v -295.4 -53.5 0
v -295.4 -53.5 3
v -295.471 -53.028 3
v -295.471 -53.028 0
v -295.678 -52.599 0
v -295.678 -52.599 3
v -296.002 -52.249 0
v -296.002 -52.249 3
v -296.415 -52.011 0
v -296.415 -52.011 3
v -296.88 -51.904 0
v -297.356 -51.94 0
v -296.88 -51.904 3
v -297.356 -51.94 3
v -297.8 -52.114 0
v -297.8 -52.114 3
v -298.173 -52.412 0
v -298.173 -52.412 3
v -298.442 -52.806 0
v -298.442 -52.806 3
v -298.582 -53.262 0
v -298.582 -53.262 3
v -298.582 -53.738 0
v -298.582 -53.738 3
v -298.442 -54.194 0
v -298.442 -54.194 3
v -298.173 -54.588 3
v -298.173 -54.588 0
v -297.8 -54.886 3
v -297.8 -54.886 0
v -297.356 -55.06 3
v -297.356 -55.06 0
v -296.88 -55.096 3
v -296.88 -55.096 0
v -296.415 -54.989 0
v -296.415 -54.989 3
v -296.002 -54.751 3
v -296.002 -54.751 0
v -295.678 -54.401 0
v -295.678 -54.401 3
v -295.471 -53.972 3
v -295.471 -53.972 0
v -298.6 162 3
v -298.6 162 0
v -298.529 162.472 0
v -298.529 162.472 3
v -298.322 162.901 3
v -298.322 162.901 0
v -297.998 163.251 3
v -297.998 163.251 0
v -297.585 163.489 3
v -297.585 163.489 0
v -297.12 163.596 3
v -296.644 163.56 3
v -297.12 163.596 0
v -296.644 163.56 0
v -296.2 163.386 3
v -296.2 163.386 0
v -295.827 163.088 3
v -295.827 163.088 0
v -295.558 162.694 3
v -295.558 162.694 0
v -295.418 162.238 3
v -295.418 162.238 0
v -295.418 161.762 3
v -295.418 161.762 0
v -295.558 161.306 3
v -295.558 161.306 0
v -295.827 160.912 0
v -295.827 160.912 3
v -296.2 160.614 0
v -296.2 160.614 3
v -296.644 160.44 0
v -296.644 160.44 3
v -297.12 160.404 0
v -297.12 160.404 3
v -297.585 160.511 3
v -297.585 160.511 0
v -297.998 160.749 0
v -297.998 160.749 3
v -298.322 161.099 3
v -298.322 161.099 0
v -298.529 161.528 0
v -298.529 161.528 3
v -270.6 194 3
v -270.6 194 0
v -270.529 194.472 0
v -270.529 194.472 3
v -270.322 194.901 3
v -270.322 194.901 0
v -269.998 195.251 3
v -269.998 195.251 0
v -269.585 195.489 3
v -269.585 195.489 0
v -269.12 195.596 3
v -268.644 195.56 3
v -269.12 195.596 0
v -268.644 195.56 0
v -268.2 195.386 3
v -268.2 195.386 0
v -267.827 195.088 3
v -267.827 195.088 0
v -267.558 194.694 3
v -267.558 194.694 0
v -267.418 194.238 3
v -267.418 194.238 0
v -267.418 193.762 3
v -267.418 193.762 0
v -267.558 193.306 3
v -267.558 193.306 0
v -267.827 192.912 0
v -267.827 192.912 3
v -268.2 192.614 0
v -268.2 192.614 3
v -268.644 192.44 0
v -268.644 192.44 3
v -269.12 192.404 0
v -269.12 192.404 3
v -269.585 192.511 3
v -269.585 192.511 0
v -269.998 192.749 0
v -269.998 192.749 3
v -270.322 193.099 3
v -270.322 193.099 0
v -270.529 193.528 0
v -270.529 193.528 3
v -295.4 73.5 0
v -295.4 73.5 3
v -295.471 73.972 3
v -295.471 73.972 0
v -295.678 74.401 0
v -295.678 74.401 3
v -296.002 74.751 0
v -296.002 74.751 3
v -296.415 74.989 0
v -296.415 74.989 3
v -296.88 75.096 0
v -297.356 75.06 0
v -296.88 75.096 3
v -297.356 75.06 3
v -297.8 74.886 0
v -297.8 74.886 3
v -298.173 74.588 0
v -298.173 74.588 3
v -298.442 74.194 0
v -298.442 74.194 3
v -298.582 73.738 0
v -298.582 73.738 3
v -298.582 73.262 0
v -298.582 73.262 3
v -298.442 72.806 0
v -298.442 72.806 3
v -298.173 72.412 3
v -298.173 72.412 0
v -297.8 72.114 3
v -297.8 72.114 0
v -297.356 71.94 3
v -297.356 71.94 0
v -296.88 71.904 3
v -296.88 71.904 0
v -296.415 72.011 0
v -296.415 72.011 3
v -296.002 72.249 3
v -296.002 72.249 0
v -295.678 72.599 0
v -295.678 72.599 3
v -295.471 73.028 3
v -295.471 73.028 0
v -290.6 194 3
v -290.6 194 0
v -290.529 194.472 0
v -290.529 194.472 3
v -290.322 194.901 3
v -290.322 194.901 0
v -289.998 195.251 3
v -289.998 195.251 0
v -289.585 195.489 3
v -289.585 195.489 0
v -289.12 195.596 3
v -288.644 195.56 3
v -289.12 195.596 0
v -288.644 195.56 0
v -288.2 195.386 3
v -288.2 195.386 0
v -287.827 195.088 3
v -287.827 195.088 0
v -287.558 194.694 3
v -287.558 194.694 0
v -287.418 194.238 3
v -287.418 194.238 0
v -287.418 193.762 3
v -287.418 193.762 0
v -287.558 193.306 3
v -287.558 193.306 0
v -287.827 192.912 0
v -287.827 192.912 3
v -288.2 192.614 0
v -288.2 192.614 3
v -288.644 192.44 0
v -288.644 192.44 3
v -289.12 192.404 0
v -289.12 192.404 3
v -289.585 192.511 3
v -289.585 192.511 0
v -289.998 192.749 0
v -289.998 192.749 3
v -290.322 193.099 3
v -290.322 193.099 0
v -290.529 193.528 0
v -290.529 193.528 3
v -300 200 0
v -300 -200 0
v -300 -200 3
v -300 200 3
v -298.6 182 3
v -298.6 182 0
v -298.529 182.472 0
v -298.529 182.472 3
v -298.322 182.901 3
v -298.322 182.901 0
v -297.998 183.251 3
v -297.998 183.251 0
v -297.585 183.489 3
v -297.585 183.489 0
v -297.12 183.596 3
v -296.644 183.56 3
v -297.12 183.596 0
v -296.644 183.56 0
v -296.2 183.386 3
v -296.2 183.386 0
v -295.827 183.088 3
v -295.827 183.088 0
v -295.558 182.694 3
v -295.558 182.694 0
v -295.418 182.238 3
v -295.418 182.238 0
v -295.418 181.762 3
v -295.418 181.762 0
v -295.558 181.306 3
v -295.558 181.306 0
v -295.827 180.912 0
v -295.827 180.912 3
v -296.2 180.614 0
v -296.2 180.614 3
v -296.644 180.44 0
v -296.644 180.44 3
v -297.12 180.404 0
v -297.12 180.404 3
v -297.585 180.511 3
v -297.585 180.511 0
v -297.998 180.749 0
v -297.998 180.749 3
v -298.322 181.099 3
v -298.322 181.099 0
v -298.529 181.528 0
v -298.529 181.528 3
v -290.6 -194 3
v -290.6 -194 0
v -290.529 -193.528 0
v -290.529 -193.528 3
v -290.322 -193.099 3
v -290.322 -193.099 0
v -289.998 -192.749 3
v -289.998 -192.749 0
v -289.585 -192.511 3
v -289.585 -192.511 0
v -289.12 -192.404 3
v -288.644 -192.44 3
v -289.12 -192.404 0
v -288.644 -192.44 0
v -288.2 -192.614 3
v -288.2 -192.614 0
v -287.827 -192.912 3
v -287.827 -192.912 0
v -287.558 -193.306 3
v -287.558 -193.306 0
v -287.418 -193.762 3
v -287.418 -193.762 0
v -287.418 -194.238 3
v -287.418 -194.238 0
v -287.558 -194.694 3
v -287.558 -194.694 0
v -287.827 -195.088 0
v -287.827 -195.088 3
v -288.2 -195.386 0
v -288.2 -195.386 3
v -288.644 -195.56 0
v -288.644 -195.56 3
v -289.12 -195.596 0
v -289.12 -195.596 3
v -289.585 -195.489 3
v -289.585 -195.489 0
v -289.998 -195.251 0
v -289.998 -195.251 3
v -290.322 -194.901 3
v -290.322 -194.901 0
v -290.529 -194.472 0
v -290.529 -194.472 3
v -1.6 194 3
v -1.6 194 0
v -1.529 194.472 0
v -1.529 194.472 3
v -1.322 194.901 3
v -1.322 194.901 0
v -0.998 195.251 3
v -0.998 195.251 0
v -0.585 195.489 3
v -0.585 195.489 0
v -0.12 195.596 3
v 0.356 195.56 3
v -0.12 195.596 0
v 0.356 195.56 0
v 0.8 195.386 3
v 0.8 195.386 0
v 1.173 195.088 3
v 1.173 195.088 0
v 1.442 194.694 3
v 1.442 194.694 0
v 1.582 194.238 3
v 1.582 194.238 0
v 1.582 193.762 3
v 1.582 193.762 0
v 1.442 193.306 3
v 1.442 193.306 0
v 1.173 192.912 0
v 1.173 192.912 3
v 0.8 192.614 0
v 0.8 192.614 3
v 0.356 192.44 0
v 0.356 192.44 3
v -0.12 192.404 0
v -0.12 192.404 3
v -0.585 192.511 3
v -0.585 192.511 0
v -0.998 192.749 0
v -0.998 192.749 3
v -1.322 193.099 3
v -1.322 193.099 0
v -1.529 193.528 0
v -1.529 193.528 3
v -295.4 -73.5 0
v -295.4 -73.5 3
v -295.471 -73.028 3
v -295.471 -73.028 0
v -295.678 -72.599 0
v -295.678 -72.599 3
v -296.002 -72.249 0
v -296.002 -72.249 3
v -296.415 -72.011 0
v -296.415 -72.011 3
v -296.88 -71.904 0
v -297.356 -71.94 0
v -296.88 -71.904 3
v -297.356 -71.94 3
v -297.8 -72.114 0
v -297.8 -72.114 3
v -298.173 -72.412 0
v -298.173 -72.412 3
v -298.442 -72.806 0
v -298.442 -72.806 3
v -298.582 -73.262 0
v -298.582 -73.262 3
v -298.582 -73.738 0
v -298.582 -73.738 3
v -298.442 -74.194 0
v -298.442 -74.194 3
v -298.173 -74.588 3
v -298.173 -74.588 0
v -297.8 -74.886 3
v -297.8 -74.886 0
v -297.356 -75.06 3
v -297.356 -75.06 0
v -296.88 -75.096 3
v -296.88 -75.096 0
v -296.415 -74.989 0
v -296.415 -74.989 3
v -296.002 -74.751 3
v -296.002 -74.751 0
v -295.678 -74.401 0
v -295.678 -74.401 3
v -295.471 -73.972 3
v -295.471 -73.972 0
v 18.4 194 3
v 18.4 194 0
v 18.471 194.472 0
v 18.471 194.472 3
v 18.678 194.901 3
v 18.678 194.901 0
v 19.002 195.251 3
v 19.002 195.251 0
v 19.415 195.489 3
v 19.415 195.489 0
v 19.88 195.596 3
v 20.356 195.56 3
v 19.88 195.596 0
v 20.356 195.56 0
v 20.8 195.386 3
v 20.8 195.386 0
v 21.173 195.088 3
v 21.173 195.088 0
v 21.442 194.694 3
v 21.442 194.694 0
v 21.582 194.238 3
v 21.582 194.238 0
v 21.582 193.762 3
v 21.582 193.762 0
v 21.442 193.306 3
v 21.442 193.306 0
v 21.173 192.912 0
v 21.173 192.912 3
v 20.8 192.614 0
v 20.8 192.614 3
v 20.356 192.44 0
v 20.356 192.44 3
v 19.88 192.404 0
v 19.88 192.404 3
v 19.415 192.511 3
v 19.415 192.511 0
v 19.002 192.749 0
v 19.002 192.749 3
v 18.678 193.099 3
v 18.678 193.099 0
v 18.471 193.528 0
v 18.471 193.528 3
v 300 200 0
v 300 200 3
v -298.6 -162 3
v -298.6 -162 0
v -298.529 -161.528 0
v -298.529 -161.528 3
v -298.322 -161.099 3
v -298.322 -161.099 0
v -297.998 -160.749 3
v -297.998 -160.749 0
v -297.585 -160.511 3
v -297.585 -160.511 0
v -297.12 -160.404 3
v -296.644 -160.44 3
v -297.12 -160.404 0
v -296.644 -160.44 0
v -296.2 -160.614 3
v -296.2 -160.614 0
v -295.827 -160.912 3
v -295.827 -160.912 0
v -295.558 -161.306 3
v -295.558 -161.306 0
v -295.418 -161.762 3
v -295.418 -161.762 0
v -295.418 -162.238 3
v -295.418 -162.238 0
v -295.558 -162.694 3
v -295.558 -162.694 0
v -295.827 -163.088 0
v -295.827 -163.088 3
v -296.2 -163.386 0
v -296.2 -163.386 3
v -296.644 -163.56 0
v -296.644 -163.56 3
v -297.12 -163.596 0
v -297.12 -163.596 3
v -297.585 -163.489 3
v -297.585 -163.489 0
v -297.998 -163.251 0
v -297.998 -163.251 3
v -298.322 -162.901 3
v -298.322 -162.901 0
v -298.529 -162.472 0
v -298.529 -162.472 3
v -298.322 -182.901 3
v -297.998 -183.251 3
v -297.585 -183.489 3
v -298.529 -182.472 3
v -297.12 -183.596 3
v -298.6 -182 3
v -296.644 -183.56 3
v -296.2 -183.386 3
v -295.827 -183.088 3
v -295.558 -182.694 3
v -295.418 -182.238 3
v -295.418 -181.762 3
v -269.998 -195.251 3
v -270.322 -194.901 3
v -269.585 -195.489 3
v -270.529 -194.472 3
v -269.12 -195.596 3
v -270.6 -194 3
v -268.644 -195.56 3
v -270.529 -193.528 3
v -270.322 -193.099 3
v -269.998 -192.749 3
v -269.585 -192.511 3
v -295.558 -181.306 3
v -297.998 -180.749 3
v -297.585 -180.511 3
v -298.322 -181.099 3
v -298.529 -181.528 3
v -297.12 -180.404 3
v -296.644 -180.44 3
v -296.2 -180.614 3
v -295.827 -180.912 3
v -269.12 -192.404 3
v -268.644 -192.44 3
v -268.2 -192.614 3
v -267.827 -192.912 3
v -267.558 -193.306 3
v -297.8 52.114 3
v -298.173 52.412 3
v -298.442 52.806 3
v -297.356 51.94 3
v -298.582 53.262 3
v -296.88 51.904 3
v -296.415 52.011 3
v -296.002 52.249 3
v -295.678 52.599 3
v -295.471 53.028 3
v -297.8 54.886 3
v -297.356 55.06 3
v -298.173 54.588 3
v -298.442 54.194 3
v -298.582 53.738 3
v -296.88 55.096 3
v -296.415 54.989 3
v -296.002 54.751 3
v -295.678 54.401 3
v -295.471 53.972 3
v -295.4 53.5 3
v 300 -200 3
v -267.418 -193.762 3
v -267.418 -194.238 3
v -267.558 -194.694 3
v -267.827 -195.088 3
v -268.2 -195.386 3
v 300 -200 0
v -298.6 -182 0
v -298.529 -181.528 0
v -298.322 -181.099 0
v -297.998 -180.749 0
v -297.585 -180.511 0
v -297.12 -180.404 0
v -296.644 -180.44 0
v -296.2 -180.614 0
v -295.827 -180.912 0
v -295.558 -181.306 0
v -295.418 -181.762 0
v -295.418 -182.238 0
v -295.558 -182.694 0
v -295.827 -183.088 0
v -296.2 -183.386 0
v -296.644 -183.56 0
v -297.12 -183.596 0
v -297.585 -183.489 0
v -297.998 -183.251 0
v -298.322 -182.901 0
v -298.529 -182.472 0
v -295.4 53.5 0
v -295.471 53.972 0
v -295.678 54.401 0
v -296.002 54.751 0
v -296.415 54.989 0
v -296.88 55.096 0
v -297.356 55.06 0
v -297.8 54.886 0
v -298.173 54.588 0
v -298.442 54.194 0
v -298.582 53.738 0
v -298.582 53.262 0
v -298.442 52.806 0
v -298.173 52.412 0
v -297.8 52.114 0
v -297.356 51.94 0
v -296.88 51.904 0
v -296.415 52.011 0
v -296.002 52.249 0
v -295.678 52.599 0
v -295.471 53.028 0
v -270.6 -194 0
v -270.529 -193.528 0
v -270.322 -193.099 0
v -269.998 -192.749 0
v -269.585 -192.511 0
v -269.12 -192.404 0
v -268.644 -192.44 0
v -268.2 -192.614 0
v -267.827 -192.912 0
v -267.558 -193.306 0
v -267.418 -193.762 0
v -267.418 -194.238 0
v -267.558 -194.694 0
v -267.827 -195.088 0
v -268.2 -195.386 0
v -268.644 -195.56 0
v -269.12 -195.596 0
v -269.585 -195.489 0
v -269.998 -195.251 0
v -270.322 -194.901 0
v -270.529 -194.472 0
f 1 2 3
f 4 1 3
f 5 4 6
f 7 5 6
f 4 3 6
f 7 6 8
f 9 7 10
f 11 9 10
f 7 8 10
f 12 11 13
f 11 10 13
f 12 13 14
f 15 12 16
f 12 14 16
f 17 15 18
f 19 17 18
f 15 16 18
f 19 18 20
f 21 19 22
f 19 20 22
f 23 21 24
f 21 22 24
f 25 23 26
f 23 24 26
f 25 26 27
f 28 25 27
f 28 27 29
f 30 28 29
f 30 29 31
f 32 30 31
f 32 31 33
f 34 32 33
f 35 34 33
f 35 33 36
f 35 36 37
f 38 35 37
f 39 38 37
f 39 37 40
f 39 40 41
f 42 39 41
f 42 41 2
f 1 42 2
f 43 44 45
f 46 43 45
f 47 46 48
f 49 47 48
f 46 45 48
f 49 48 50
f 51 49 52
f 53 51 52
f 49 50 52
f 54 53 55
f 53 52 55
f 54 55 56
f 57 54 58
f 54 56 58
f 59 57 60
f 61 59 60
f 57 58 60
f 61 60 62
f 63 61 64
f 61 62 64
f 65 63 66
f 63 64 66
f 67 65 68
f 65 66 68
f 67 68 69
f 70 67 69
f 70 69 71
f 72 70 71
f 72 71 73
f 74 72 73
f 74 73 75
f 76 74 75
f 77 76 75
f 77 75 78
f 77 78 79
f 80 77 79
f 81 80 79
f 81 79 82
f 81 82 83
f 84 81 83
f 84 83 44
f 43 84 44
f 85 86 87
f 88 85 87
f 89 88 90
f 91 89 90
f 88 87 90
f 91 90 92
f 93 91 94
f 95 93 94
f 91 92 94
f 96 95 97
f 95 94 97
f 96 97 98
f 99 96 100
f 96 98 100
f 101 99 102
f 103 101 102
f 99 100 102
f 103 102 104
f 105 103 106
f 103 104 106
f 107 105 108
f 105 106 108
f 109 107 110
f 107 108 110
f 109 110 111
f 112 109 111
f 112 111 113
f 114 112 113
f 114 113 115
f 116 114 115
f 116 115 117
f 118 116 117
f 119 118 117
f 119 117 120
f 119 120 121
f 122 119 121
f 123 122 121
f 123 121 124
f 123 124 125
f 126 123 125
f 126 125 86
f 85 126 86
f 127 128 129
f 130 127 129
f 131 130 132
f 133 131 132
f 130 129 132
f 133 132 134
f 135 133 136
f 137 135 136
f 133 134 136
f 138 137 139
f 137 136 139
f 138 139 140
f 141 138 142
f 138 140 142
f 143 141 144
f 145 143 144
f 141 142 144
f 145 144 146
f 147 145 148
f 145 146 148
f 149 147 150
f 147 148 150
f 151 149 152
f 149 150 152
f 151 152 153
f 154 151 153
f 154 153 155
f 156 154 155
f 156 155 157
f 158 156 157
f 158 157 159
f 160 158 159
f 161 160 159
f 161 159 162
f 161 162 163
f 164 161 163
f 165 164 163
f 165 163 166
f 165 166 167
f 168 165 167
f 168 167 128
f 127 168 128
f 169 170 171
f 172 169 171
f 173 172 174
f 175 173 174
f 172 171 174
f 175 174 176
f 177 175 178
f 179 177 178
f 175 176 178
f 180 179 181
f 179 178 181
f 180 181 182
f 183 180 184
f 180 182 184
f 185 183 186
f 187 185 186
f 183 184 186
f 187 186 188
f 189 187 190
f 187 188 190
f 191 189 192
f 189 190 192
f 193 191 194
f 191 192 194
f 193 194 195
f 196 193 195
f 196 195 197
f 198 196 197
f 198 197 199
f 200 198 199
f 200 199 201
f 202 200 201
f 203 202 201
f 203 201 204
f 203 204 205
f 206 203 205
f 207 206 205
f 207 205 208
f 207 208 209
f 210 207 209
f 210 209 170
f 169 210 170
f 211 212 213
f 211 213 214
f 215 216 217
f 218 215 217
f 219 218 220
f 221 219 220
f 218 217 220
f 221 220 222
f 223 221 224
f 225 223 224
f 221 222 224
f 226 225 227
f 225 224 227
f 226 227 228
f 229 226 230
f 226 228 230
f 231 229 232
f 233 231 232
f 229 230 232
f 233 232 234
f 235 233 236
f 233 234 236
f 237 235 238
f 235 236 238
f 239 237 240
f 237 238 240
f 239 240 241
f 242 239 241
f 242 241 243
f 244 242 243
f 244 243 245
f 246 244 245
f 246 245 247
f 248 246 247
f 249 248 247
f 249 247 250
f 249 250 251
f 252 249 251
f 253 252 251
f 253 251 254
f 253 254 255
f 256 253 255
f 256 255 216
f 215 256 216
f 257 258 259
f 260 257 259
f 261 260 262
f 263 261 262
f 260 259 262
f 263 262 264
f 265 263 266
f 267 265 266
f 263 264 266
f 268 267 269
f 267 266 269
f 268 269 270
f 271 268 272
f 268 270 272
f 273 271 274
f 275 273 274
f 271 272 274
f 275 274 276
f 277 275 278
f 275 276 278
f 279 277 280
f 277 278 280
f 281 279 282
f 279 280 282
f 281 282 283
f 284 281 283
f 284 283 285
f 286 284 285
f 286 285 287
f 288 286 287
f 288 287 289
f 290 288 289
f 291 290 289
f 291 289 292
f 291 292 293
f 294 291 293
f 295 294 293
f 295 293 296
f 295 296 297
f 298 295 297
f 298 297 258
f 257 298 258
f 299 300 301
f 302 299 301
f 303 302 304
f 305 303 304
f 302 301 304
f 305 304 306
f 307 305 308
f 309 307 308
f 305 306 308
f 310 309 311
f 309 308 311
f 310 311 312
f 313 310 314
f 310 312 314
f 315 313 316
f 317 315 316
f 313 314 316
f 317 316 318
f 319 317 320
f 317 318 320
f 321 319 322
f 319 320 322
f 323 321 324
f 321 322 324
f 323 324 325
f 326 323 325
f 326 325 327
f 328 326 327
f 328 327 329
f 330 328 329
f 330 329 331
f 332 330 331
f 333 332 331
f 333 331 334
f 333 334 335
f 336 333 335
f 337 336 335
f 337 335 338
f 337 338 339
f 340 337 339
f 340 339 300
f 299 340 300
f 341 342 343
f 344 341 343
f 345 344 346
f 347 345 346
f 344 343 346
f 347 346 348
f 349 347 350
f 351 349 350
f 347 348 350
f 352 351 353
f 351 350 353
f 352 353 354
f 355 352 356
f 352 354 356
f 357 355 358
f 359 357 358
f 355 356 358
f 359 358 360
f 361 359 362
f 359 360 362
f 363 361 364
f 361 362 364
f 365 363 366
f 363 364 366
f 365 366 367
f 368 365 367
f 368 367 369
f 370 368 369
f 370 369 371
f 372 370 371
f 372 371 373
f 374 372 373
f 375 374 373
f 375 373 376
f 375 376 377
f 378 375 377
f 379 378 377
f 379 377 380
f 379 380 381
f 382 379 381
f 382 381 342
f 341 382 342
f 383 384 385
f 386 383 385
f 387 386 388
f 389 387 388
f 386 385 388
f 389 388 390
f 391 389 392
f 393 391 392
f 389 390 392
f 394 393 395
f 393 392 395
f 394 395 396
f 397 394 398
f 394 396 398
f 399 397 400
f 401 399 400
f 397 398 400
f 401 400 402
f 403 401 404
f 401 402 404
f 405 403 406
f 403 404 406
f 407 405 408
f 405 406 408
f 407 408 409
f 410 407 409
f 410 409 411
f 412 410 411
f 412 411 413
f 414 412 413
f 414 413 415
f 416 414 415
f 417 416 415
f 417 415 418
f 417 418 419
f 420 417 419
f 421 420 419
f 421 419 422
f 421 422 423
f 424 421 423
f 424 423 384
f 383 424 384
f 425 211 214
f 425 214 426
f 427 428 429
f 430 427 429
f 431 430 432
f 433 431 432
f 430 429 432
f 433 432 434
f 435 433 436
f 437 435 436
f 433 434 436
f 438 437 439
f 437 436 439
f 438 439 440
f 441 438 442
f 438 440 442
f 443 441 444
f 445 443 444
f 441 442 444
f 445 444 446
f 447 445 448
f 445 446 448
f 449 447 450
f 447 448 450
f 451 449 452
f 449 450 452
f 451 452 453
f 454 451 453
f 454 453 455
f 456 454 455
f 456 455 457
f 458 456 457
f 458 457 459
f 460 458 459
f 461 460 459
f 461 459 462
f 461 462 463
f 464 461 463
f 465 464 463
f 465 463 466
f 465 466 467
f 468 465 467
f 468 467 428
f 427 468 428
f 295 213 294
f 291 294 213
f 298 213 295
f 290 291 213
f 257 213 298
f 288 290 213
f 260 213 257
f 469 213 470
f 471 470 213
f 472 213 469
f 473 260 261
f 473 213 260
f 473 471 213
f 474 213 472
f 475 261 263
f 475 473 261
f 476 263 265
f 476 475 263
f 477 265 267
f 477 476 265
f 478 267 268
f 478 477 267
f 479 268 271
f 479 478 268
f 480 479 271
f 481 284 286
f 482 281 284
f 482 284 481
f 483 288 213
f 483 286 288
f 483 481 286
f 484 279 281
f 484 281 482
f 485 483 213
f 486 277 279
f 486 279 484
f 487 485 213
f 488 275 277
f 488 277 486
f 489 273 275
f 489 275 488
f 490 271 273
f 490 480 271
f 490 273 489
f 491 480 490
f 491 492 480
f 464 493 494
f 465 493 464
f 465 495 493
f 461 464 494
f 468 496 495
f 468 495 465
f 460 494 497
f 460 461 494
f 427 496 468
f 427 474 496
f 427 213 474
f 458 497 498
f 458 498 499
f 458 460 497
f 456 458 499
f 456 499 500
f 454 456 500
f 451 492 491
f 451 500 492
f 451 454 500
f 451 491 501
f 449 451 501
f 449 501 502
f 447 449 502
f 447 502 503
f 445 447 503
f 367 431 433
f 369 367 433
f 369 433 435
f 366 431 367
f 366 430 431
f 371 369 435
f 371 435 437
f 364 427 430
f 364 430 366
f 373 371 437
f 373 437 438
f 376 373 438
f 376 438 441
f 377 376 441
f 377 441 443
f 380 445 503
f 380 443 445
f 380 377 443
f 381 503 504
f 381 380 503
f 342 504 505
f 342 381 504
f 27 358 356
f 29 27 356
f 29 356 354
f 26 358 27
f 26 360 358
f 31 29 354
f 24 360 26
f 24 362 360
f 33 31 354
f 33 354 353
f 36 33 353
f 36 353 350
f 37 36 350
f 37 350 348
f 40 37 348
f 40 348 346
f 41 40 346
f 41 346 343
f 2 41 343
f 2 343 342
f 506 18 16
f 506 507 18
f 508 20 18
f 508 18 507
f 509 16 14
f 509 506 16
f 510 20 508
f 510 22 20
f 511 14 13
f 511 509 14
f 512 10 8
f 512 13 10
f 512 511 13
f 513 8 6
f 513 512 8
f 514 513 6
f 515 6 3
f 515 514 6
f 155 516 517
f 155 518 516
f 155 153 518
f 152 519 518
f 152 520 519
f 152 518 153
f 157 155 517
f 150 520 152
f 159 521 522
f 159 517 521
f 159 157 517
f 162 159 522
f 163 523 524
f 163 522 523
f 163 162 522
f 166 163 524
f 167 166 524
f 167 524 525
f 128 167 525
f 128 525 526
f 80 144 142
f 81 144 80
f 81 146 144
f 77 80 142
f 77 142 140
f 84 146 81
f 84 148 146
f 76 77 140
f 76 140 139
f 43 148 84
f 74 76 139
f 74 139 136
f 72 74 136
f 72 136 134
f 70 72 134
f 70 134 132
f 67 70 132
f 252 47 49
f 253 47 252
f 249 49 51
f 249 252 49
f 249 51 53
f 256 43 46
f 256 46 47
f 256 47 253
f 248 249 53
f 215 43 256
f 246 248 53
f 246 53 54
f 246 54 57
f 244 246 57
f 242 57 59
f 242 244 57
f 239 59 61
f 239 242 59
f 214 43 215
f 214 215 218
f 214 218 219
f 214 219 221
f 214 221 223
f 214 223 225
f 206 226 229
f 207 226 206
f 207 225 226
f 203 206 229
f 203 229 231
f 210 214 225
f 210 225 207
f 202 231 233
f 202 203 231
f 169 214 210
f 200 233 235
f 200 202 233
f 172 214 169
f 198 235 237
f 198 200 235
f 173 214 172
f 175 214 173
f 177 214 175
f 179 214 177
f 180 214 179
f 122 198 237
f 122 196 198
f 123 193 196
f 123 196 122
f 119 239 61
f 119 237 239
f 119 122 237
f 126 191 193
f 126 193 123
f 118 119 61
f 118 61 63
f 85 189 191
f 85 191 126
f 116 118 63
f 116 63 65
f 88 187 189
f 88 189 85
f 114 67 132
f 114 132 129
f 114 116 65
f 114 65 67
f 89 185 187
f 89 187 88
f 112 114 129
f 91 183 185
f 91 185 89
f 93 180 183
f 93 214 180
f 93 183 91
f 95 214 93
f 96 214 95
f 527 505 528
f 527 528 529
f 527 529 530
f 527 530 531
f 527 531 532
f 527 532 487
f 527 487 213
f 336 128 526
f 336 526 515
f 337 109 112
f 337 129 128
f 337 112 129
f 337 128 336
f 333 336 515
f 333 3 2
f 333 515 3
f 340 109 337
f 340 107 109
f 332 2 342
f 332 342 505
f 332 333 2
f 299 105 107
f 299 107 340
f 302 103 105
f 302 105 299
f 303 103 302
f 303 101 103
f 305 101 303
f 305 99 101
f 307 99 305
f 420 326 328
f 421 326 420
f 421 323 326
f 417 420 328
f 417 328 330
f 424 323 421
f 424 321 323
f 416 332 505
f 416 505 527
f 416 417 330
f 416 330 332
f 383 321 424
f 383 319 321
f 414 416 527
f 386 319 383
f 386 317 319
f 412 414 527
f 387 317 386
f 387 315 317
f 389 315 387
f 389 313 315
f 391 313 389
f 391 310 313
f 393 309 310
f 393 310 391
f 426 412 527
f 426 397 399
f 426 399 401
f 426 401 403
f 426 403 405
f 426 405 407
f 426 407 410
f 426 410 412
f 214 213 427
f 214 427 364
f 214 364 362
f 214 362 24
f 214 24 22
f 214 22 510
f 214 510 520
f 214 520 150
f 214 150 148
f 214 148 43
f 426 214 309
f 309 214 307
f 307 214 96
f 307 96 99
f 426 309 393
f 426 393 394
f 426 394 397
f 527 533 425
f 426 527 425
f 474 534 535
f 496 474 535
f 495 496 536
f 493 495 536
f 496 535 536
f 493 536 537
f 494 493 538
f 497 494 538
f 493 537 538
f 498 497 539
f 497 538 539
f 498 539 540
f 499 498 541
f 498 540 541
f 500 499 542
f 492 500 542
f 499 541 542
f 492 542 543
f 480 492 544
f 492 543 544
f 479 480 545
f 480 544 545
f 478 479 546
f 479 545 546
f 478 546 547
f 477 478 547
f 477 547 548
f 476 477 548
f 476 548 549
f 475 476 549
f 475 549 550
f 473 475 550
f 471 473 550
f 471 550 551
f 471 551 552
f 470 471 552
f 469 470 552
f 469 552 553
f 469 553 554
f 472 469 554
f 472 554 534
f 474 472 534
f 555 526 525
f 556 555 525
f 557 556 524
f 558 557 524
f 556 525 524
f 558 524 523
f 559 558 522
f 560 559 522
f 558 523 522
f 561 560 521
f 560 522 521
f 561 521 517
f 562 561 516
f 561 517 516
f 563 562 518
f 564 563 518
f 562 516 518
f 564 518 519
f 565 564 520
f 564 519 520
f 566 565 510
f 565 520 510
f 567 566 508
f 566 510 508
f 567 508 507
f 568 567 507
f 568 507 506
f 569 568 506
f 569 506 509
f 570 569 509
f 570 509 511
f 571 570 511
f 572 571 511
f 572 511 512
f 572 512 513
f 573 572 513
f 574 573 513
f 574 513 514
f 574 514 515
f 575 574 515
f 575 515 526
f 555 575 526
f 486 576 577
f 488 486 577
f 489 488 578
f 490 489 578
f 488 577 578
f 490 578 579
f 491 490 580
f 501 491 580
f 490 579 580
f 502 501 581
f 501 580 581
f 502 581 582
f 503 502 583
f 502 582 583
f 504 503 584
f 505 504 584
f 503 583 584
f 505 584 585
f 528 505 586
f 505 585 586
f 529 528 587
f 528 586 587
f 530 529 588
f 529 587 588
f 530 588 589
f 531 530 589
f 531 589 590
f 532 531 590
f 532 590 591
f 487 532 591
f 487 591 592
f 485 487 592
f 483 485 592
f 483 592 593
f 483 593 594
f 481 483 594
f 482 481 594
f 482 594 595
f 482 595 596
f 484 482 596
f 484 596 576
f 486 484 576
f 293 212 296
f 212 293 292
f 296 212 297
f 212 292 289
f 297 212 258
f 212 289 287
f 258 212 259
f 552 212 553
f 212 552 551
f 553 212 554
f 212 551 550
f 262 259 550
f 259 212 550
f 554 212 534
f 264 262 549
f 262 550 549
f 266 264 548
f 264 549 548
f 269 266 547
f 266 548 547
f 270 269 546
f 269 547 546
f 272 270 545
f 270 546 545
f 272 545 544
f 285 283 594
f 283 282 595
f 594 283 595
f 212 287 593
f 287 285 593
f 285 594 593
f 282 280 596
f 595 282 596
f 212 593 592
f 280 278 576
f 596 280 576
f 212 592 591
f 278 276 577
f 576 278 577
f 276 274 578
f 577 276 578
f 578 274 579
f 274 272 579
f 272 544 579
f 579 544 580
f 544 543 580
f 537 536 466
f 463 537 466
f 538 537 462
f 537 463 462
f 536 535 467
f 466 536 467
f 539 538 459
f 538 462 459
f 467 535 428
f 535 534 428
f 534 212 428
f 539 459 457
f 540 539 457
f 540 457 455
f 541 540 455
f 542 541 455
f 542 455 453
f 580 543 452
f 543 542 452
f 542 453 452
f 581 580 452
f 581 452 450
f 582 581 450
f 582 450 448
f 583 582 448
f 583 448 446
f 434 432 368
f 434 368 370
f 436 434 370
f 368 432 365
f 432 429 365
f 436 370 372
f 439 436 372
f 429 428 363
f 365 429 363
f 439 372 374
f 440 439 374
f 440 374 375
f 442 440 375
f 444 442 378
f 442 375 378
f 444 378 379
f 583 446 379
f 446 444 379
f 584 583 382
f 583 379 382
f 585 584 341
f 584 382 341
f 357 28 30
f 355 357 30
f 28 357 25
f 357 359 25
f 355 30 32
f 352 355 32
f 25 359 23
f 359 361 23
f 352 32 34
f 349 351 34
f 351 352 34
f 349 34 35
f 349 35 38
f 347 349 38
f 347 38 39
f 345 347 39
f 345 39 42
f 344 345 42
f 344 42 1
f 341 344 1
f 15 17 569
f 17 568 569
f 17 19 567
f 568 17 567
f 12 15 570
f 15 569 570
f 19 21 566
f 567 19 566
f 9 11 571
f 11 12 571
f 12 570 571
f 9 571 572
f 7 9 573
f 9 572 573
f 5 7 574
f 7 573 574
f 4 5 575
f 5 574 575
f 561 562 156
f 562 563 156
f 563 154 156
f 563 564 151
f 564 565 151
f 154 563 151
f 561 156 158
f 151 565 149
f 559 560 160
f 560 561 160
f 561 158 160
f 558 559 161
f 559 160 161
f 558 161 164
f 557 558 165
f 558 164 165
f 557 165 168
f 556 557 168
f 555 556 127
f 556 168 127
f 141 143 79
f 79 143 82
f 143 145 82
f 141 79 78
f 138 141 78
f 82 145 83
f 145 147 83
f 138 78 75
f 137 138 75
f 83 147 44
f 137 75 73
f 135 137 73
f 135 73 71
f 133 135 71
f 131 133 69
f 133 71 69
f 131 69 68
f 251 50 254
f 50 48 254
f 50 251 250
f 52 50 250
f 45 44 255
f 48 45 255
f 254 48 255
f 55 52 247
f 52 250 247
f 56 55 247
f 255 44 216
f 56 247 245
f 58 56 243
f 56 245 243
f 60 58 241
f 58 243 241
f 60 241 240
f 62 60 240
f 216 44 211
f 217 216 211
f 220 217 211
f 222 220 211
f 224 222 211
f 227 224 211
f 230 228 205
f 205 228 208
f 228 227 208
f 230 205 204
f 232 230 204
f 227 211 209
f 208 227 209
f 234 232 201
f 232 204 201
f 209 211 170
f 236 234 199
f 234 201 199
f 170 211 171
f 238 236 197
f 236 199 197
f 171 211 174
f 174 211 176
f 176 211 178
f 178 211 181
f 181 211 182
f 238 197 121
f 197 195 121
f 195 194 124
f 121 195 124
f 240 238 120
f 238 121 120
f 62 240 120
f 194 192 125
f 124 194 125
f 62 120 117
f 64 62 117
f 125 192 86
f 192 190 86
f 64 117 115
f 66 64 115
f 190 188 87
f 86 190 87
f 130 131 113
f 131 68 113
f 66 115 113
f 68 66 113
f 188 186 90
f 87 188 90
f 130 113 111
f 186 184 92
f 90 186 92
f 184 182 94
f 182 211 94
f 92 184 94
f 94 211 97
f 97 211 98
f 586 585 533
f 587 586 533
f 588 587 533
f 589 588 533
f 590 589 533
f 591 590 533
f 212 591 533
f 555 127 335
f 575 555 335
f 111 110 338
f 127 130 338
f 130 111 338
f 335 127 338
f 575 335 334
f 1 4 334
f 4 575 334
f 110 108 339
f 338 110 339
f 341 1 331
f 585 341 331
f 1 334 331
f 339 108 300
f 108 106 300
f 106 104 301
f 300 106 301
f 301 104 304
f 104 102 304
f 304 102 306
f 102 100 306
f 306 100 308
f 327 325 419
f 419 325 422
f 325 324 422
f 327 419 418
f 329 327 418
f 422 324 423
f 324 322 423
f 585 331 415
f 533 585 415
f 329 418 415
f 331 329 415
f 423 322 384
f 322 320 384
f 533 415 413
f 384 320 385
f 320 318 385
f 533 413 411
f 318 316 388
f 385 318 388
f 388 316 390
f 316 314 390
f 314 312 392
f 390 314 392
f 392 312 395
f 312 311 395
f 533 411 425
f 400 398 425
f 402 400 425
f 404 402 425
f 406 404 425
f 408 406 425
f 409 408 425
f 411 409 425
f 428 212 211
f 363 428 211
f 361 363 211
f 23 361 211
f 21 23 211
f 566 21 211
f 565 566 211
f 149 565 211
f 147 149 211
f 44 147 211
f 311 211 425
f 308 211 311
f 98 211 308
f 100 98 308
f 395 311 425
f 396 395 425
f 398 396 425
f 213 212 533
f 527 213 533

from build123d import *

# Parameters (mm, degrees)
SKETCH_1_W          = 600
SKETCH_1_H          = 400
EXTRUDE_1_DEPTH     = 3
SKETCH_3_R          = 1.6
CUT_EXTRUDE_1_DEPTH = 361.567608085
SKETCH_4_R          = 1.6
CUT_EXTRUDE_2_DEPTH = 361.567608085
SKETCH_5_R          = 1.6
CUT_EXTRUDE_3_DEPTH = 361.567608085


with BuildPart() as part:
    # 草图1 → 凸台-拉伸1 (new body)
    with BuildSketch(Plane.XY):
        Rectangle(SKETCH_1_W, SKETCH_1_H)
    extrude(amount=EXTRUDE_1_DEPTH)

    # 草图3 → 切除-拉伸1 (cut, through all)
    with BuildSketch(Plane(origin=(0, 0, 0), x_dir=(-1, 0, 0), z_dir=(0, 0, -1))):
        with Locations((269, -194)):
            Circle(SKETCH_3_R)
        with Locations((289, -194)):
            Circle(SKETCH_3_R)
        with Locations((297, -182)):
            Circle(SKETCH_3_R)
        with Locations((297, -162)):
            Circle(SKETCH_3_R)
        with Locations((297, 162)):
            Circle(SKETCH_3_R)
        with Locations((297, 182)):
            Circle(SKETCH_3_R)
        with Locations((289, 194)):
            Circle(SKETCH_3_R)
        with Locations((269, 194)):
            Circle(SKETCH_3_R)
    extrude(amount=-CUT_EXTRUDE_1_DEPTH, mode=Mode.SUBTRACT)

    # 草图4 → 切除-拉伸2 (cut, through all)
    with BuildSketch(Plane(origin=(0, 0, 0), x_dir=(-1, 0, 0), z_dir=(0, 0, -1))):
        with Locations((0, 194)):
            Circle(SKETCH_4_R)
        with Locations((-20, 194)):
            Circle(SKETCH_4_R)
    extrude(amount=-CUT_EXTRUDE_2_DEPTH, mode=Mode.SUBTRACT)

    # 草图5 → 切除-拉伸3 (cut, through all)
    with BuildSketch(Plane.XY.offset(3)):
        with Locations((-297, 73.5)):
            Circle(SKETCH_5_R)
        with Locations((-297, 53.5)):
            Circle(SKETCH_5_R)
        with Locations((-297, -53.5)):
            Circle(SKETCH_5_R)
        with Locations((-297, -73.5)):
            Circle(SKETCH_5_R)
    extrude(amount=-CUT_EXTRUDE_3_DEPTH, mode=Mode.SUBTRACT)


solid = part.part
